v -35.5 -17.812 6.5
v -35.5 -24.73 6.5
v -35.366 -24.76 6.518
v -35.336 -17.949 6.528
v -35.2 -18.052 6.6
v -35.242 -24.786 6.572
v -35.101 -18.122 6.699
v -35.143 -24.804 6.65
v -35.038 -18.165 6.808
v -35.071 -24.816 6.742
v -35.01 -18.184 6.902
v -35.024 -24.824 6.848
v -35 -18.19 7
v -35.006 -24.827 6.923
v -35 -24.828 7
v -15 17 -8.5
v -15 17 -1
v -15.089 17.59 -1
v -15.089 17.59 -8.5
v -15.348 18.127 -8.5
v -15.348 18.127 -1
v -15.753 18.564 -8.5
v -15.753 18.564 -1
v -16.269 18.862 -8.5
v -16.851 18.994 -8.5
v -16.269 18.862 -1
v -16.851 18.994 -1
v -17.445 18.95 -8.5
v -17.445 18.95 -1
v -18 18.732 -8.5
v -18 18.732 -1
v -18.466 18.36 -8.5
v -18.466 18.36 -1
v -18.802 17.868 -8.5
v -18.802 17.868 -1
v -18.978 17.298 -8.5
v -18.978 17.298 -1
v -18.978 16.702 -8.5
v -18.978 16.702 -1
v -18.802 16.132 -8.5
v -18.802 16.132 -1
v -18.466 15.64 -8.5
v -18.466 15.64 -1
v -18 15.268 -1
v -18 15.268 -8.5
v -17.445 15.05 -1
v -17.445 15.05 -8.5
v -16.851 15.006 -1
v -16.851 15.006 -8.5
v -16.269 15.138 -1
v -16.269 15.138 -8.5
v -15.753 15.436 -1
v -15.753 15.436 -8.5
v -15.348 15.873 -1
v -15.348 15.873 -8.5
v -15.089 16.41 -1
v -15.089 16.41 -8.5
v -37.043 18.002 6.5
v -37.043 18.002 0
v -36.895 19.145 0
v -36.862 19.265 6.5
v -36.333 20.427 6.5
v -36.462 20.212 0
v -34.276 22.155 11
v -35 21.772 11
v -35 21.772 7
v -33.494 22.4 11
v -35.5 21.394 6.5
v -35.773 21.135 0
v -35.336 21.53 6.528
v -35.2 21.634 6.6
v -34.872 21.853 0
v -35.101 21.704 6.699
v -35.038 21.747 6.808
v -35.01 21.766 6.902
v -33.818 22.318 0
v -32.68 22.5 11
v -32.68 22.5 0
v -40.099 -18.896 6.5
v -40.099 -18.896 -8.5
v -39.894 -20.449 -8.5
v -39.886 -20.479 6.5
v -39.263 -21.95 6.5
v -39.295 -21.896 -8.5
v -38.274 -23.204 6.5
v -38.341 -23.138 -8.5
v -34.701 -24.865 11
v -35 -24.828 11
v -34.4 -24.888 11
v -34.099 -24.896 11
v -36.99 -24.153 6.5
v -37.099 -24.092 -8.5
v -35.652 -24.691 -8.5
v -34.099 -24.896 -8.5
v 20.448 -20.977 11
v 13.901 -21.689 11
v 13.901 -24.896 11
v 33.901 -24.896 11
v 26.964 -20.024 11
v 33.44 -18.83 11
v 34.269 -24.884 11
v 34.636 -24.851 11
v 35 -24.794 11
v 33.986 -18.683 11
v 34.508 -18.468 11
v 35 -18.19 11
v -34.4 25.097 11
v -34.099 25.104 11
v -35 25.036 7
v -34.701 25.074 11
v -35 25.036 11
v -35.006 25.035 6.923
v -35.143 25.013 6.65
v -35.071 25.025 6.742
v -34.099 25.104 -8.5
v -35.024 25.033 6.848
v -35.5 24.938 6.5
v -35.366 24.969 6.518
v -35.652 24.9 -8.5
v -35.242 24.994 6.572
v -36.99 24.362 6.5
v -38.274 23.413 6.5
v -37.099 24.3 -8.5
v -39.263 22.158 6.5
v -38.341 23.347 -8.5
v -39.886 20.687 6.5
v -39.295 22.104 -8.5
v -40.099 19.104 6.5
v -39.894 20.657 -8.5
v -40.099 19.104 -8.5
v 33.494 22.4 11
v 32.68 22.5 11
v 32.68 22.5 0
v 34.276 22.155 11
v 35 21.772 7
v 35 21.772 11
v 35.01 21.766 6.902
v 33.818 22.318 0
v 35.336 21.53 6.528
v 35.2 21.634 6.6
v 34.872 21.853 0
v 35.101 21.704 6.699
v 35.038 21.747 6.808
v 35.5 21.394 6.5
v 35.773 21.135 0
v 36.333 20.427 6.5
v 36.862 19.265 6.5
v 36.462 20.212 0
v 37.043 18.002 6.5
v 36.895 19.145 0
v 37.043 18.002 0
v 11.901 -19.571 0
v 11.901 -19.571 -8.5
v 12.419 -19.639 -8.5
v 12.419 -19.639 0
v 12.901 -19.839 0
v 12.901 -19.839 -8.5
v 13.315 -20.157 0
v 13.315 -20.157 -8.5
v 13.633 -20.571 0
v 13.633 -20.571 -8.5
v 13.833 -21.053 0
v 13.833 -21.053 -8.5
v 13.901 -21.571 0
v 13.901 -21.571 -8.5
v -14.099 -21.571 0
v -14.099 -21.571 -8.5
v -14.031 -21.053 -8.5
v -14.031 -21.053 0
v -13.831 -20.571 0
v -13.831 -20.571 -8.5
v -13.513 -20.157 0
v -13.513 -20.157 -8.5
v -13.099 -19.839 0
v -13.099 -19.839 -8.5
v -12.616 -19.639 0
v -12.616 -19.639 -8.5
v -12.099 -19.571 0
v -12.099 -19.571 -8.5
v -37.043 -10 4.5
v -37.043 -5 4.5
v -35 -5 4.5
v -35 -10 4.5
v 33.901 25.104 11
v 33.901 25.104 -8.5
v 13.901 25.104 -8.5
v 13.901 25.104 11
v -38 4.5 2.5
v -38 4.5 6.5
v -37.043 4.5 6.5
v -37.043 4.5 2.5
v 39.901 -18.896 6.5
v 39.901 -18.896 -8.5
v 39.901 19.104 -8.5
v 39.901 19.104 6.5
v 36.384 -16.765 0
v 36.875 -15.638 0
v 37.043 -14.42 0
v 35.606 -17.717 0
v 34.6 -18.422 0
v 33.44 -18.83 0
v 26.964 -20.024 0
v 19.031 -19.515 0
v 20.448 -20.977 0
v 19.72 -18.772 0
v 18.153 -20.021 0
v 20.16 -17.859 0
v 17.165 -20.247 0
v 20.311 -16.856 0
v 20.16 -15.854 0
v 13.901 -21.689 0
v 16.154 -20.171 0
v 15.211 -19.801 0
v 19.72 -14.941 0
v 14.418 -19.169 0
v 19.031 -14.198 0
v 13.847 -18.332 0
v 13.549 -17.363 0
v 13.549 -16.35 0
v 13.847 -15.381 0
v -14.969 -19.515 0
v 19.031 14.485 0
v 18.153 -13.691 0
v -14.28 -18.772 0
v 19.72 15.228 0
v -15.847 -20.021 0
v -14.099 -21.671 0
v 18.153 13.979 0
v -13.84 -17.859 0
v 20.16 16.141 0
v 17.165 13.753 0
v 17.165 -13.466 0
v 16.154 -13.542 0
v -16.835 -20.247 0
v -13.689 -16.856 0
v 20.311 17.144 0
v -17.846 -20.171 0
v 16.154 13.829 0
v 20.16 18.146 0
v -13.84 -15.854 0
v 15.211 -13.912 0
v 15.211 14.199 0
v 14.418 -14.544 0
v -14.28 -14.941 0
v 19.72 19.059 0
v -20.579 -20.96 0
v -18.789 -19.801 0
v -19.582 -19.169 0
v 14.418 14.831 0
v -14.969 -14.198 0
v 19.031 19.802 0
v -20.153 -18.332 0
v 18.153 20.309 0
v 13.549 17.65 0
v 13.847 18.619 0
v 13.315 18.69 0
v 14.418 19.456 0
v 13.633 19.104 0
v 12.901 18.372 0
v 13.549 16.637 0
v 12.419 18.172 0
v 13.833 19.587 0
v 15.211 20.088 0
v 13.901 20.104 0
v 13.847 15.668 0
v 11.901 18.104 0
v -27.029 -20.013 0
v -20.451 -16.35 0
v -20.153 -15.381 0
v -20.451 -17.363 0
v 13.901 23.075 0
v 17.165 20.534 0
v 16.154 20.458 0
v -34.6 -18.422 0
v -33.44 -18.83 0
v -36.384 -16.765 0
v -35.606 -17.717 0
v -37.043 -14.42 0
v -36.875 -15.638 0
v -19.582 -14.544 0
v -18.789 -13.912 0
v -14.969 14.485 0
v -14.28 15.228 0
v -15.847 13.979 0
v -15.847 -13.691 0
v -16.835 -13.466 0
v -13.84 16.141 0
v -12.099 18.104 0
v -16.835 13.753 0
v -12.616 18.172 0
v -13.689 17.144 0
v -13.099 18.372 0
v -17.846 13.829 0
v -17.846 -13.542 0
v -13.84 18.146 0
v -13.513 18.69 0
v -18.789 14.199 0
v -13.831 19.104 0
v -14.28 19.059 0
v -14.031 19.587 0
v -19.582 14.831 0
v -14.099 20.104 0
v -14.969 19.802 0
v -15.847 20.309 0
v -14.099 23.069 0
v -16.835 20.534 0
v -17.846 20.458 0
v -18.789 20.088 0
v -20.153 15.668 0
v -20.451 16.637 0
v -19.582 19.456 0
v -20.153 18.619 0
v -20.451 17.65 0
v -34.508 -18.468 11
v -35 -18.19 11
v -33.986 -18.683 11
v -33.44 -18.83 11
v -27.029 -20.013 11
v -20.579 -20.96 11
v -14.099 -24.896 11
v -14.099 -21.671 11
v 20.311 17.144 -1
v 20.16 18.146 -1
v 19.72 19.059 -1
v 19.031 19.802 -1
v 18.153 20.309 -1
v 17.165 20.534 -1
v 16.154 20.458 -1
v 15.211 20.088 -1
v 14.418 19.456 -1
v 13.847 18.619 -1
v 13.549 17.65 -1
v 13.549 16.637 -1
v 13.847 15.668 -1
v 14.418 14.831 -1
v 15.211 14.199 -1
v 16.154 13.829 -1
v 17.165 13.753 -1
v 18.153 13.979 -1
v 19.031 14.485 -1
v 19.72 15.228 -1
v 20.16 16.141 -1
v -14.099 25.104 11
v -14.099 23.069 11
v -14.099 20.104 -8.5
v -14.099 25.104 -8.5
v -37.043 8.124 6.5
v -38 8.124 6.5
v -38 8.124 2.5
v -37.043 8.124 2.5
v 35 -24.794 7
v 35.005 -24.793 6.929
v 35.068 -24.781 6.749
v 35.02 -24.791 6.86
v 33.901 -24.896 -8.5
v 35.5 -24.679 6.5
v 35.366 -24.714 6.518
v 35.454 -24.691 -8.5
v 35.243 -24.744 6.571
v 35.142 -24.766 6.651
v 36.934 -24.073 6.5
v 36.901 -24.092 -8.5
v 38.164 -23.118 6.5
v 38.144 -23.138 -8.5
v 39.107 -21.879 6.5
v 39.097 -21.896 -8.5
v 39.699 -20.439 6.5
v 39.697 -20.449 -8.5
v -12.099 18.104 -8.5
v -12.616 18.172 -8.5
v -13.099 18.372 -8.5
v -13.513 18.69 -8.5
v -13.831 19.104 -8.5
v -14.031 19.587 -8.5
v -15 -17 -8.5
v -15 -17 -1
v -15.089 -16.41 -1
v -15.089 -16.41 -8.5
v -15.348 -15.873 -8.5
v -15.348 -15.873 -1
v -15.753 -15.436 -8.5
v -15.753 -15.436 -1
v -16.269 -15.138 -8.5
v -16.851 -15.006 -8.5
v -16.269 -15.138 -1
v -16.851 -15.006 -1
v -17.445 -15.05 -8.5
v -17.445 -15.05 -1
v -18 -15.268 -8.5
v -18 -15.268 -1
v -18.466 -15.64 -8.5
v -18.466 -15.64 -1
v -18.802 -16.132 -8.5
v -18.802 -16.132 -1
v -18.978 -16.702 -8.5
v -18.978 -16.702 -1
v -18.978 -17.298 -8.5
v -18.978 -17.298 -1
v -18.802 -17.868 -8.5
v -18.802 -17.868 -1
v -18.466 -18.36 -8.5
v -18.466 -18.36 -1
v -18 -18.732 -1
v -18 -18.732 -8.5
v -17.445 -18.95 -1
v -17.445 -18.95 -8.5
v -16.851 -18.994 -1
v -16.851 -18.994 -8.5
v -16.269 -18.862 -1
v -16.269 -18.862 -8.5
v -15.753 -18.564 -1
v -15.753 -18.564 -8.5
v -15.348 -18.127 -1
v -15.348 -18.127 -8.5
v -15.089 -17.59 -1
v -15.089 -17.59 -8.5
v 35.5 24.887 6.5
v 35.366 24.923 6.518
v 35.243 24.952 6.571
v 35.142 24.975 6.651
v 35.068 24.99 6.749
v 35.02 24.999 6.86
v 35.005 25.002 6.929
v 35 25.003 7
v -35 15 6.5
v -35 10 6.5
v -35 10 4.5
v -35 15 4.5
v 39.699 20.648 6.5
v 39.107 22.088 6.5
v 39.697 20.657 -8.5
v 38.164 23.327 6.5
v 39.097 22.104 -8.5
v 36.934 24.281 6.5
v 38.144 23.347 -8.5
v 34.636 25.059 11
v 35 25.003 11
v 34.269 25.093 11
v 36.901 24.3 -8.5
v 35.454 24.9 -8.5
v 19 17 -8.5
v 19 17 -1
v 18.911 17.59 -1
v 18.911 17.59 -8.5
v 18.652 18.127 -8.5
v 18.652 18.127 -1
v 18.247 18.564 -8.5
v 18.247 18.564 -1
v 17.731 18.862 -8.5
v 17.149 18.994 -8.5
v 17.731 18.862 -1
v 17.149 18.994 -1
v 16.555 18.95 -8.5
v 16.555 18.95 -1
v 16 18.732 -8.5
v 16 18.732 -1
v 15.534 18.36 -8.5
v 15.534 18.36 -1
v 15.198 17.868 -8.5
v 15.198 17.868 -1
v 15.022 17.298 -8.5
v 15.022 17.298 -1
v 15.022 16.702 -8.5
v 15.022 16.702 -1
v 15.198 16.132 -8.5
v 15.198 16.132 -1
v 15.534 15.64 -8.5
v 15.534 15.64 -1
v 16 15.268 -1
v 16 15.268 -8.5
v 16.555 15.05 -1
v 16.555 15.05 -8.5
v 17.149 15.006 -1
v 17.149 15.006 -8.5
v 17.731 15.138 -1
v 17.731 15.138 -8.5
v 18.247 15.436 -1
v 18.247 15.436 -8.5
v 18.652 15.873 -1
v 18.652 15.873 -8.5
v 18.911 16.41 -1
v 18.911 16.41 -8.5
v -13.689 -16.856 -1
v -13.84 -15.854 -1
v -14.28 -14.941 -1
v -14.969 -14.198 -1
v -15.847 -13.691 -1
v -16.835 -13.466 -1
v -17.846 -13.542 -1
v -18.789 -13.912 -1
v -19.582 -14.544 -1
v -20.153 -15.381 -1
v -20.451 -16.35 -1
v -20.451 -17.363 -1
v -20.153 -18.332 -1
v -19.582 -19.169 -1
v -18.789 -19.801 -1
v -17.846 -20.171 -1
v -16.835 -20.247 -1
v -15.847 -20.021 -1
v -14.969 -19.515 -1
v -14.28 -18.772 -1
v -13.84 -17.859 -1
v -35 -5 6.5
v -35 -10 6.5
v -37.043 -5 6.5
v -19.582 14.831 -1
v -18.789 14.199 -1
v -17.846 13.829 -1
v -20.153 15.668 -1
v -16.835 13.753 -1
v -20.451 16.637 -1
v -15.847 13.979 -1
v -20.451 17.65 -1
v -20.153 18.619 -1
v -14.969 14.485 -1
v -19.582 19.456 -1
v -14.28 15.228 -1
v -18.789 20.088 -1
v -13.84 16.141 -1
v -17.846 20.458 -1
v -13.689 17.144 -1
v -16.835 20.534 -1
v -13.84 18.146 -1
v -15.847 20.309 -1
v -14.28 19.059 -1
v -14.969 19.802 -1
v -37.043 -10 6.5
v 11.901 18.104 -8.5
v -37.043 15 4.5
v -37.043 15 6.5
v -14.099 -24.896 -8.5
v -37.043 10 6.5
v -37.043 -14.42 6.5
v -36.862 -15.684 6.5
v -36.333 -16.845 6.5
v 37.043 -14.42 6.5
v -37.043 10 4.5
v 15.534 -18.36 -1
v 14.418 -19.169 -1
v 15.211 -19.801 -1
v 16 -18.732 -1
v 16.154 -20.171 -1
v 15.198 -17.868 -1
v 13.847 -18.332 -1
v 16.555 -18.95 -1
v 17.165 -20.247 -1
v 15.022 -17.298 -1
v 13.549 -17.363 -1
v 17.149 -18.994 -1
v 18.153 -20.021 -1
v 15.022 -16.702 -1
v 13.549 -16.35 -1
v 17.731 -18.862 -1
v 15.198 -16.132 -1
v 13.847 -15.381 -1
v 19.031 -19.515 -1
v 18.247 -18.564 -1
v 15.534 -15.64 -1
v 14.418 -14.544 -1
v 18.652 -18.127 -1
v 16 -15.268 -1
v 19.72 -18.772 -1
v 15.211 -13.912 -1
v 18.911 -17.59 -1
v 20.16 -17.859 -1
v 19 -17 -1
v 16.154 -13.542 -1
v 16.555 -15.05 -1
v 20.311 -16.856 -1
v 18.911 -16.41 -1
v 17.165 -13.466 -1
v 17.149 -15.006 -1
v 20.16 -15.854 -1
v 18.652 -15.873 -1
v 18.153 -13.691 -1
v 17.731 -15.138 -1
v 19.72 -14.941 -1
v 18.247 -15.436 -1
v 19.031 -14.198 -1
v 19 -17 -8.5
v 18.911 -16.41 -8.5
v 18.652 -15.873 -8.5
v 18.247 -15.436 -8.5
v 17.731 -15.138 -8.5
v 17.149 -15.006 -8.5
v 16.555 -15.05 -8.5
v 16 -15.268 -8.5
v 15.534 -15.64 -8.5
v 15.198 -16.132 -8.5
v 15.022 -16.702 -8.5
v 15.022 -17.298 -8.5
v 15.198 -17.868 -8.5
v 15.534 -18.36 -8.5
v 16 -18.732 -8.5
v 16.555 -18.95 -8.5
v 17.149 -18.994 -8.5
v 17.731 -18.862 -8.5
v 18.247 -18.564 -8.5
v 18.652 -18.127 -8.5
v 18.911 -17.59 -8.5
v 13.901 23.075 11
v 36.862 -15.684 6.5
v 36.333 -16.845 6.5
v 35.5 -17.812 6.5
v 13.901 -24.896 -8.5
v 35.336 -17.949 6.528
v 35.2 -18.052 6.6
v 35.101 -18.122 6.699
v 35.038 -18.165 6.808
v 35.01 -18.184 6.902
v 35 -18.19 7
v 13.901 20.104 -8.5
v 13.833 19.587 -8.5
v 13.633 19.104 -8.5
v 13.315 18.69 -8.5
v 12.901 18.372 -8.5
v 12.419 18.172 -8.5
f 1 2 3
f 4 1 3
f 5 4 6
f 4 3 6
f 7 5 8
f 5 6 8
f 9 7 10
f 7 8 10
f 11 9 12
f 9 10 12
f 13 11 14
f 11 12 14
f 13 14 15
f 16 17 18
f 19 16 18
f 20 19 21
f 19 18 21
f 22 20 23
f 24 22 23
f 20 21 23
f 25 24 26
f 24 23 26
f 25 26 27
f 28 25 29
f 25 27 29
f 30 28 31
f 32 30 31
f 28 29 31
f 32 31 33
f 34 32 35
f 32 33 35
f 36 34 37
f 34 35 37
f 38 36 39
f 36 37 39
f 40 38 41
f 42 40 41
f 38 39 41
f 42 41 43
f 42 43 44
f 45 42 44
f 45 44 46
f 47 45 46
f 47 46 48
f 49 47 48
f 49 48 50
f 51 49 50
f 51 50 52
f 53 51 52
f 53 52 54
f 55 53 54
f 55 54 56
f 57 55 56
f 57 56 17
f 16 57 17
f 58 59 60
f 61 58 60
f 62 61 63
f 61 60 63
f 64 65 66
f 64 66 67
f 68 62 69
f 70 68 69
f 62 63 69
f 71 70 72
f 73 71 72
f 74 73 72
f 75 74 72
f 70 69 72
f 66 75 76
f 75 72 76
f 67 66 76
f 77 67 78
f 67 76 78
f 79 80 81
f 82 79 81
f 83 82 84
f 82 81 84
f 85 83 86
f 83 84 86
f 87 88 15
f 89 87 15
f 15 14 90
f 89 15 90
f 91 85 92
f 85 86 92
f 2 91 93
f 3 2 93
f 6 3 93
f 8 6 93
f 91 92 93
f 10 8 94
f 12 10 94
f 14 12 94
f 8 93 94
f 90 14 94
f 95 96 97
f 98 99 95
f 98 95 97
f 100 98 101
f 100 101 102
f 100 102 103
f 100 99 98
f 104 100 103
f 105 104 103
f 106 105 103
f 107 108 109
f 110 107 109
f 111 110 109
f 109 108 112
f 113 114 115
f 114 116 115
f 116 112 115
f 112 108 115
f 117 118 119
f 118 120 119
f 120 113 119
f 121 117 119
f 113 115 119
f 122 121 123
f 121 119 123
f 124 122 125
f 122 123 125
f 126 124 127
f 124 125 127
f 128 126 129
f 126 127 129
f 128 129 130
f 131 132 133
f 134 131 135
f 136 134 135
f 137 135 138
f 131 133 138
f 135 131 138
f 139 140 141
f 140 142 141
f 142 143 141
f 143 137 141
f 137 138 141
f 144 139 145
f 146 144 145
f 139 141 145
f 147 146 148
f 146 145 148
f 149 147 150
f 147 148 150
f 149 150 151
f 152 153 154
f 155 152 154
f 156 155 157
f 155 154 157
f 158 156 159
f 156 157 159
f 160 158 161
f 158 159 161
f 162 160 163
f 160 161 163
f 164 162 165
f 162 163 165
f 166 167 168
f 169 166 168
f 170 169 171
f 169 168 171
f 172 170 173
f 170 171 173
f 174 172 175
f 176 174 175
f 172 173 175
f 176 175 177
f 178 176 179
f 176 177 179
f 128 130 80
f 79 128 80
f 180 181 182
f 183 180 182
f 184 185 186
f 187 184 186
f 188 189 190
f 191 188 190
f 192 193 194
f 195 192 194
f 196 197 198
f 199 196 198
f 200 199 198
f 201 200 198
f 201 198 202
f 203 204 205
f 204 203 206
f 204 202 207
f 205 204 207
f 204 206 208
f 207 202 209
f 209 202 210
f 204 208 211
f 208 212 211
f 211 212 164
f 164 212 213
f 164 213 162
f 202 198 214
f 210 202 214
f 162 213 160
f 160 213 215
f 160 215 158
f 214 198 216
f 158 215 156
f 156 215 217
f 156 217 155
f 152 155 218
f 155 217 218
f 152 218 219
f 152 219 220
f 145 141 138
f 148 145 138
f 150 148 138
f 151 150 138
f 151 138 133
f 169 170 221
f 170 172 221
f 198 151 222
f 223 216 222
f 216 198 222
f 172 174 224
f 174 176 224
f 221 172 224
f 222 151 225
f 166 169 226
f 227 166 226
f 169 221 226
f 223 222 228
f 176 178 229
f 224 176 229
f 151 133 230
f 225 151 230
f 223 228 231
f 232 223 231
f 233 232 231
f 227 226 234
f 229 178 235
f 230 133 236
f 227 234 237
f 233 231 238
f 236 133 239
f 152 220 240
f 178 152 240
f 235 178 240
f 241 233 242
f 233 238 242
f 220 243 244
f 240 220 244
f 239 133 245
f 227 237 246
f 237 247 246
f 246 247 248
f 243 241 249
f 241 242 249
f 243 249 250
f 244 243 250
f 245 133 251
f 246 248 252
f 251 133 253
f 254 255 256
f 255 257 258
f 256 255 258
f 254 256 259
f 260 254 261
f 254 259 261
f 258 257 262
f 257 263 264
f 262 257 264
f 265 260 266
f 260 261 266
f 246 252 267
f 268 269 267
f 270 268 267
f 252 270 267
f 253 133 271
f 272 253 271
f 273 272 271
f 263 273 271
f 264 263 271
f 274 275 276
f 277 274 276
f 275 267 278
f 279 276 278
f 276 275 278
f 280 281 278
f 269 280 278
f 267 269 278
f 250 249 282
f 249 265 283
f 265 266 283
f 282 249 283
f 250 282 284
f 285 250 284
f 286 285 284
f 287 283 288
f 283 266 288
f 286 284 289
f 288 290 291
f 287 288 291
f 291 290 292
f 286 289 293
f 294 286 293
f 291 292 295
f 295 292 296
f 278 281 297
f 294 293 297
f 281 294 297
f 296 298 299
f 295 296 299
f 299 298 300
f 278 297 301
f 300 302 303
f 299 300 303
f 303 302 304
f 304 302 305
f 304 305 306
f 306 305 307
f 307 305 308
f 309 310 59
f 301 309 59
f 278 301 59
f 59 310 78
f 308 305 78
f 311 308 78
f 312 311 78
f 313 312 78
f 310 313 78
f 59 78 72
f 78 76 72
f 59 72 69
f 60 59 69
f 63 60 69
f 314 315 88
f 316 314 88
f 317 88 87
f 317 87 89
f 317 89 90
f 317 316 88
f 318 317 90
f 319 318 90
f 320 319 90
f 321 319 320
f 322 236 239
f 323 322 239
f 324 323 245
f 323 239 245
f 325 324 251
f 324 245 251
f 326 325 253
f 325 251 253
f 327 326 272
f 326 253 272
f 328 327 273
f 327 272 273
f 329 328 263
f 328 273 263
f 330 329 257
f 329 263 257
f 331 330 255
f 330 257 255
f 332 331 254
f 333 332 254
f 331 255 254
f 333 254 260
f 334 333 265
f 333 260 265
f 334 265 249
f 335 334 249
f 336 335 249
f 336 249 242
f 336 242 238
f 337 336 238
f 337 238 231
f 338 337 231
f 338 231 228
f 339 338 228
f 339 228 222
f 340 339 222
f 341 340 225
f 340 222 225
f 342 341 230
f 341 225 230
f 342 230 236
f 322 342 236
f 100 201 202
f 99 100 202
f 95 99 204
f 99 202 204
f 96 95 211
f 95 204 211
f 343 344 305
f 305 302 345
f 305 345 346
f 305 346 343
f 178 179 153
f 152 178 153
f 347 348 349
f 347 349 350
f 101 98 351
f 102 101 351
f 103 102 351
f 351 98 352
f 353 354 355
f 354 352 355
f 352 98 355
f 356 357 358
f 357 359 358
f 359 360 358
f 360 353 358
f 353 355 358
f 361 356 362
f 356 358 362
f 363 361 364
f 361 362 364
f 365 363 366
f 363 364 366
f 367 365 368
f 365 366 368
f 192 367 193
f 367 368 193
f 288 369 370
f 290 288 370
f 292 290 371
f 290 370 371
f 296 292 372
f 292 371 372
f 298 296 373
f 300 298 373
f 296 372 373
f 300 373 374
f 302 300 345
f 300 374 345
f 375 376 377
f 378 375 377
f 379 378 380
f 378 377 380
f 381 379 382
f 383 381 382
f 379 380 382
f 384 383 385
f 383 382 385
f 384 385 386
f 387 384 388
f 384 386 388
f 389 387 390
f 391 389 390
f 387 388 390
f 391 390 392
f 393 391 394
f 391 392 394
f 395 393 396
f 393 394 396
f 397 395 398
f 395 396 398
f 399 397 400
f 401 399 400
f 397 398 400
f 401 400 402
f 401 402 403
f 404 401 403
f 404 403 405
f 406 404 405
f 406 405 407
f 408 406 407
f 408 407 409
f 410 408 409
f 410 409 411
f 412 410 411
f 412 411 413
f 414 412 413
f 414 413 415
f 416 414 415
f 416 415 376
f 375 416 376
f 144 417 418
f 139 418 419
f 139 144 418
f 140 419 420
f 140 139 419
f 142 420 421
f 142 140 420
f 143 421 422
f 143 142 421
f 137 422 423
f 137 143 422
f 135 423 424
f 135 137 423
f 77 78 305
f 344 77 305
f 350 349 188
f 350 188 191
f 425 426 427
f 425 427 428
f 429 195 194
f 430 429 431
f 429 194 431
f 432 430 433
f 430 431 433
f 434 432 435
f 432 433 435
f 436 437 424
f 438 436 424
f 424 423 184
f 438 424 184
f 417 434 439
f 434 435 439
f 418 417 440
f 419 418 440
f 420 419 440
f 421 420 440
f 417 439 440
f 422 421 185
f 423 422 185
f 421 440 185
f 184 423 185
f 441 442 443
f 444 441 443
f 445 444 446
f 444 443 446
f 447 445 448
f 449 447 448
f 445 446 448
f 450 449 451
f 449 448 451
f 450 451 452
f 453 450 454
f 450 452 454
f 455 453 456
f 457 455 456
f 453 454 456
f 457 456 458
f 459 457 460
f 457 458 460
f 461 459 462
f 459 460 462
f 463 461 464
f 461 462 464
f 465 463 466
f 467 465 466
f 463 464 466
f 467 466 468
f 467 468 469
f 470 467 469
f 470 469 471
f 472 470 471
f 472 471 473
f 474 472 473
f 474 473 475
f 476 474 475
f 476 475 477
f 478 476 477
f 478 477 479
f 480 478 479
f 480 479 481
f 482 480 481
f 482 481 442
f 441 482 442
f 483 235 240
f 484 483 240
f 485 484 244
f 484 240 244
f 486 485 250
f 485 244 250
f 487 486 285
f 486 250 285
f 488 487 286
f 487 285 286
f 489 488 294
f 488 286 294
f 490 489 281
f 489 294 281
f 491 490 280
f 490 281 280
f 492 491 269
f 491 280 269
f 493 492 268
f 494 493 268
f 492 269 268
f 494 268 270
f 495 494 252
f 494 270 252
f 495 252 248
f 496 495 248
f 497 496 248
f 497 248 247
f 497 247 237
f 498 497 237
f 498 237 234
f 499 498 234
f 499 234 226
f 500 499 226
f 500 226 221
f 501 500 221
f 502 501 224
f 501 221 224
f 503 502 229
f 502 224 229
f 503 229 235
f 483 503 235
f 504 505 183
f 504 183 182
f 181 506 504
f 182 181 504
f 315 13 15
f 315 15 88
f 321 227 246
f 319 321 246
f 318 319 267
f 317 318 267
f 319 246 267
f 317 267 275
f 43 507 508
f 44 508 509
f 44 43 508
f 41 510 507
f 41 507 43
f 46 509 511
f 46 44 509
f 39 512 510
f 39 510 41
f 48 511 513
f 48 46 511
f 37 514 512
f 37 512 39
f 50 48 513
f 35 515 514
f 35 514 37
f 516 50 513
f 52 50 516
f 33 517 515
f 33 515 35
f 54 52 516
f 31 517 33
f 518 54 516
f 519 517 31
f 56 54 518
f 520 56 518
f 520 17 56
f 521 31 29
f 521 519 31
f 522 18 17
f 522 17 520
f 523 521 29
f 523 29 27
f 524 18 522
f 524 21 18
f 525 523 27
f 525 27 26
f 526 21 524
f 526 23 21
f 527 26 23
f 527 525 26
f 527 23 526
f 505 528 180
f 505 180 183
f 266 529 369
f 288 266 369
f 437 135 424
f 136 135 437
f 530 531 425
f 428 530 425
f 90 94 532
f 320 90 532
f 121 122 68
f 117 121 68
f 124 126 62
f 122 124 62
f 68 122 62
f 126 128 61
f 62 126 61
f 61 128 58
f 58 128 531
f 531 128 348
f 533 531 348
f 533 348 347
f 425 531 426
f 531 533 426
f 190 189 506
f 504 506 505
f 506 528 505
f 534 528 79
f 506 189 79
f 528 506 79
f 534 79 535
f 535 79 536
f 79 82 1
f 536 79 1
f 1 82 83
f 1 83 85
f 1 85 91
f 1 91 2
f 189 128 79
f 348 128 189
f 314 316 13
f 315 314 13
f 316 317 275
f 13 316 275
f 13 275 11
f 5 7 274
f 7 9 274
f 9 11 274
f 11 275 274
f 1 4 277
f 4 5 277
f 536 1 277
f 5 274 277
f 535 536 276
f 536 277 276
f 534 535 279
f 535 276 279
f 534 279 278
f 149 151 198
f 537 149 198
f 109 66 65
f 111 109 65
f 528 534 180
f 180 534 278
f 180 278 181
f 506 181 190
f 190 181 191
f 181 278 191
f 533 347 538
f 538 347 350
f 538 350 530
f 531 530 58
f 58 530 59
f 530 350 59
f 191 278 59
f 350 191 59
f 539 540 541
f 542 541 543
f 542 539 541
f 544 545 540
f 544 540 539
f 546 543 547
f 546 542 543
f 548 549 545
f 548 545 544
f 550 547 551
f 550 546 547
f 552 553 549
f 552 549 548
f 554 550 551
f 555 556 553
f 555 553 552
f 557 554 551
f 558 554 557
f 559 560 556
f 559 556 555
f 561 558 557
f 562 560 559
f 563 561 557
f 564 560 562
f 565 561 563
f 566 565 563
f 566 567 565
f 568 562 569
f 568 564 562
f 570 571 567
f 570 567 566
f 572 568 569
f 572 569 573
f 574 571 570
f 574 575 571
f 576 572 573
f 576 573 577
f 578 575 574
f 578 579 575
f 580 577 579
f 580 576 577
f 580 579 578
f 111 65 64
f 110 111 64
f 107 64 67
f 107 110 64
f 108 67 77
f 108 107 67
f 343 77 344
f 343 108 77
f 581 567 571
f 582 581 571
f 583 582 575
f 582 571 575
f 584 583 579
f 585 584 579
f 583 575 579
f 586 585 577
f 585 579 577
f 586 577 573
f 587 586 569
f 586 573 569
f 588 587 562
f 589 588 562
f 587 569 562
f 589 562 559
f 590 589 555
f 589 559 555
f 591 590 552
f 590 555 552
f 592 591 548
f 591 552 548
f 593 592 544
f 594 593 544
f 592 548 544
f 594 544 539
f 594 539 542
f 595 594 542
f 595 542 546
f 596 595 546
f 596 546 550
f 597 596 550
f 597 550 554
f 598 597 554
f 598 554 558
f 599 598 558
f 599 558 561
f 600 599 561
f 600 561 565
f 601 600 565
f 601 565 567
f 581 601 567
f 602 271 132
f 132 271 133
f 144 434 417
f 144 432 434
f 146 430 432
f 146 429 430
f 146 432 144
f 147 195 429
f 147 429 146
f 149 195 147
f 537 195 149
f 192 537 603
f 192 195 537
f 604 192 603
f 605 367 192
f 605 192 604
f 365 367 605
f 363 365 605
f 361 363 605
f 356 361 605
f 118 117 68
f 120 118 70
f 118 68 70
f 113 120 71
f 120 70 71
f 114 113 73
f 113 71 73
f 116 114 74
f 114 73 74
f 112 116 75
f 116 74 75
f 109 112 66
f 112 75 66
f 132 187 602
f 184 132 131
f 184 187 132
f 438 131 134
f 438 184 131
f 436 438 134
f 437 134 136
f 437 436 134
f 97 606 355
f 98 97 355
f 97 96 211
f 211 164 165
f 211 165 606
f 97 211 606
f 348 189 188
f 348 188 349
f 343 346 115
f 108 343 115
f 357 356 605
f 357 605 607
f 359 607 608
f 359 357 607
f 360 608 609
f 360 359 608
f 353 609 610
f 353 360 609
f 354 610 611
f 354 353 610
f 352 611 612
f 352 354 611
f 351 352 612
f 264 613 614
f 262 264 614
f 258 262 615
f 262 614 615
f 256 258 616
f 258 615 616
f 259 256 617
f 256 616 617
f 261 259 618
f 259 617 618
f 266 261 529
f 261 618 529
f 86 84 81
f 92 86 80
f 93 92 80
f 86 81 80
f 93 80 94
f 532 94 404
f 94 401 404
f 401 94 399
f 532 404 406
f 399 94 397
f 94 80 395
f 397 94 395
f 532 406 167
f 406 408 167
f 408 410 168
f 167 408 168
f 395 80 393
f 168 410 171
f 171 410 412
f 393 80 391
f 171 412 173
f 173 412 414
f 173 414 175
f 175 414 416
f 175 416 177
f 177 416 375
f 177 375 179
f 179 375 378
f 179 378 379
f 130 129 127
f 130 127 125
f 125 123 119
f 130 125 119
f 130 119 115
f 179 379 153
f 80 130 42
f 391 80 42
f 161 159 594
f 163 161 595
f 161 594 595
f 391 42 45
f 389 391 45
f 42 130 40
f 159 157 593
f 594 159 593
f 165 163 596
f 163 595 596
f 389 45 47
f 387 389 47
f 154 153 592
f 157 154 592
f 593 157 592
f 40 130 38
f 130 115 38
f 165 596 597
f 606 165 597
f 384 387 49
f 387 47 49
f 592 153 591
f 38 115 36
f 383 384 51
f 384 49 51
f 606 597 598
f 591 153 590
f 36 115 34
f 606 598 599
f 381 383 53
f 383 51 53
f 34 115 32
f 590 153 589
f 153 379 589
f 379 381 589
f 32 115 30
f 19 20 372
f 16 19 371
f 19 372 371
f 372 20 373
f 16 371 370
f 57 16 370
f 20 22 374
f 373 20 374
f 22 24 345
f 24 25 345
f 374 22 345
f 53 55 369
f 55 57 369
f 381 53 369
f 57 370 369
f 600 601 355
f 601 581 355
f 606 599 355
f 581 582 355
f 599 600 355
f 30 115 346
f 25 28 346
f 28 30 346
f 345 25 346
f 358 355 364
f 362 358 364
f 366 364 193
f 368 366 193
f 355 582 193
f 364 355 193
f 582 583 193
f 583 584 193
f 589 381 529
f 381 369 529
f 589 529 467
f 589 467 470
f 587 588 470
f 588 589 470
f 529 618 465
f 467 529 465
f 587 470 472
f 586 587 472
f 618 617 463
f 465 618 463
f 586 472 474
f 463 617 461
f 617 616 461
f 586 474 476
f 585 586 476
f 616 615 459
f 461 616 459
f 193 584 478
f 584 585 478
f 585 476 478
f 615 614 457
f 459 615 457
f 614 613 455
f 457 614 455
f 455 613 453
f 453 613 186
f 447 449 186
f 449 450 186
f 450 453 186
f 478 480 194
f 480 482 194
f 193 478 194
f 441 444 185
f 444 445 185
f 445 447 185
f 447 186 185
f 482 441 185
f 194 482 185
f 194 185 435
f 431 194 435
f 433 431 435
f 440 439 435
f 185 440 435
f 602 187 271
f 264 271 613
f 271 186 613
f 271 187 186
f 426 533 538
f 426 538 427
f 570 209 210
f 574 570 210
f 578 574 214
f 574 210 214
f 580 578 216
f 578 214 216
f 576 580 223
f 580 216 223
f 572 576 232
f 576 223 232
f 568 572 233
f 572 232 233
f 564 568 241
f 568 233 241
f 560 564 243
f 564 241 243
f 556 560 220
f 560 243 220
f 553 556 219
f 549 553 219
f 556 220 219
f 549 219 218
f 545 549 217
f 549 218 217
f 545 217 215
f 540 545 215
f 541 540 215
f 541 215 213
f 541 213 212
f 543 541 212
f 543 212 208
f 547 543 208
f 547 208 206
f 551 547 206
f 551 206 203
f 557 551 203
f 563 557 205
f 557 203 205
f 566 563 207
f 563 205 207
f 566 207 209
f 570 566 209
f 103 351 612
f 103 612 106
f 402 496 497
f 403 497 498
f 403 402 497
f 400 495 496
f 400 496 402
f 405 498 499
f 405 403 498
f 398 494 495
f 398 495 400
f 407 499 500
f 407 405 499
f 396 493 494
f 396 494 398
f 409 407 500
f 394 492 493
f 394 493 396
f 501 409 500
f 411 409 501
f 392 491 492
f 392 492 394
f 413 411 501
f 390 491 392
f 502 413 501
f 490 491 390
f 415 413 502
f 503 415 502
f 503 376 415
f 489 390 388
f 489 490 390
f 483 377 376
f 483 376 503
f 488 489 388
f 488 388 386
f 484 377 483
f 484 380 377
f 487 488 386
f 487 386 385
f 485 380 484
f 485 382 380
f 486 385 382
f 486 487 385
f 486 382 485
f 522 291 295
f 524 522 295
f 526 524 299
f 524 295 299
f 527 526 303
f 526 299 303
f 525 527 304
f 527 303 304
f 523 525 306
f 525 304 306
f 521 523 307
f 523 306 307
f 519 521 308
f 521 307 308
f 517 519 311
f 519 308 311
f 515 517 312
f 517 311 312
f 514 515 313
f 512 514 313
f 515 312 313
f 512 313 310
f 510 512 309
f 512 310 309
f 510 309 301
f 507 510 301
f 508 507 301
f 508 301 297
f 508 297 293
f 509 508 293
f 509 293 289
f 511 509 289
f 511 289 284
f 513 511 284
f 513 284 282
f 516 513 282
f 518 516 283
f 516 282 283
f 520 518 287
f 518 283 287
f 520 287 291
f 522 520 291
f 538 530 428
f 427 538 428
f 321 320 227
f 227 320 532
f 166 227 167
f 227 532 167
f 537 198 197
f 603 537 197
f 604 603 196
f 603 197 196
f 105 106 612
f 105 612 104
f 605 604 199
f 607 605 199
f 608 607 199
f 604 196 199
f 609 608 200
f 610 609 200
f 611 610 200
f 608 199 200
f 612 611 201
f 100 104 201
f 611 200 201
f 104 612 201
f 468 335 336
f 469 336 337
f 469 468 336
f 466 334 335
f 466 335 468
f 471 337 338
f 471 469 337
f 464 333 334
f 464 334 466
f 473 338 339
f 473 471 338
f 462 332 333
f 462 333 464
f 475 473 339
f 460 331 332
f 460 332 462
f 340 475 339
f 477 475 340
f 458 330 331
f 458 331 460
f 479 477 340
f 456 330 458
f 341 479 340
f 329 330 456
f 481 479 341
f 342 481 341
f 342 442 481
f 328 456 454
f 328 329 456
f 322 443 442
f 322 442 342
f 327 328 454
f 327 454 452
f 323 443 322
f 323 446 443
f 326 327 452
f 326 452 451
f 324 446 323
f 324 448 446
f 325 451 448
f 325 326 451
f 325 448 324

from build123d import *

# Parameters (mm, degrees)
XOR_EXTRUDE1_580_DEPTH          = 11
XOR_EXTRUDE1_580_DEPTH_BACK     = 8.5
XOR_EXTRUDE2_CUT_582_DEPTH      = 23
XOR_EXTRUDE3_CUT_585_DEPTH      = 30
XOR_EXTRUDE3_CUT_585_DEPTH_BACK = 31.5
XOR_SKETCH4_MESH_586_R          = 2
XOR_EXTRUDE4_CUT_587_DEPTH      = 30
XOR_SKETCH5_MESH_588_R          = 3.4
XOR_EXTRUDE5_CUT_949_DEPTH      = 1
XOR_SKETCH6_MESH_1066_W         = 3.25
XOR_SKETCH6_MESH_1066_H         = 5
XOR_SKETCH6_MESH_1066_W_2       = 2.9
XOR_EXTRUDE6_MERGE_1279_DEPTH   = 2
XOR_SKETCH7_MESH_2256_W         = 3
XOR_SKETCH7_MESH_2256_H         = 3.62350981
XOR_EXTRUDE7_CUT_2327_DEPTH     = 4


with BuildPart() as part:
    # XOR_Sketch1 (Mesh)_7 → XOR_Extrude1_580 (new, two sides: drawn at the far end of the back side and taken through both)
    with BuildSketch(Plane.XY.offset(-XOR_EXTRUDE1_580_DEPTH_BACK)):
        with BuildLine():
            Line((11.901247371, 18.104240693), (-12.098752629, 18.104240693))
            ThreePointArc((-12.098752629, 18.104240693), (-13.512966192, 18.690027131), (-14.098752629, 20.104240693))
            Line((-14.098752629, 20.104240693), (-14.098752629, 25.104240693))
            Line((-14.098752629, 25.104240693), (-34.098752629, 25.104240693))
            ThreePointArc((-34.098752629, 25.104240693), (-38.341393316, 23.34688138), (-40.098752629, 19.104240693))
            Line((-40.098752629, 19.104240693), (-40.098752629, -18.895759307))
            ThreePointArc((-40.098752629, -18.895759307), (-38.341393316, -23.138399994), (-34.098752629, -24.895759307))
            Line((-34.098752629, -24.895759307), (-14.098752629, -24.895759307))
            Line((-14.098752629, -24.895759307), (-14.098752629, -21.570783007))
            ThreePointArc((-14.098752629, -21.570783007), (-13.512966192, -20.156569445), (-12.098752629, -19.570783007))
            Line((-12.098752629, -19.570783007), (11.901247371, -19.570783007))
            ThreePointArc((11.901247371, -19.570783007), (13.315460933, -20.156569445), (13.901247371, -21.570783007))
            Line((13.901247371, -21.570783007), (13.901247371, -24.895759307))
            Line((13.901247371, -24.895759307), (33.901247371, -24.895759307))
            ThreePointArc((33.901247371, -24.895759307), (38.143888058, -23.138399994), (39.901247371, -18.895759307))
            Line((39.901247371, -18.895759307), (39.901247371, 19.104240693))
            ThreePointArc((39.901247371, 19.104240693), (38.143888058, 23.34688138), (33.901247371, 25.104240693))
            Line((33.901247371, 25.104240693), (13.901247371, 25.104240693))
            Line((13.901247371, 25.104240693), (13.901247371, 20.104240693))
            ThreePointArc((13.901247371, 20.104240693), (13.315460933, 18.690027131), (11.901247371, 18.104240693))
        make_face()
    extrude(amount=XOR_EXTRUDE1_580_DEPTH + XOR_EXTRUDE1_580_DEPTH_BACK)

    # XOR_Sketch2 (Mesh)_581 → XOR_Extrude2 (Cut)_582 (cut)
    with BuildSketch(Plane.XY):
        with BuildLine():
            Line((37.042591497, 18.002105269), (37.042591497, -14.420226453))
            ThreePointArc((37.042591497, -14.420226453), (36.027448956, -17.267289587), (33.440027724, -18.829830542))
            ThreePointArc((33.440027724, -18.829830542), (16.804364648, -21.403203006), (0, -22.393587061))
            ThreePointArc((0, -22.393587061), (-16.804364648, -21.403203006), (-33.440027724, -18.829830542))
            ThreePointArc((-33.440027724, -18.829830542), (-36.027448956, -17.267289587), (-37.042591497, -14.420226453))
            Line((-37.042591497, -14.420226453), (-37.042591497, 18.002105269))
            ThreePointArc((-37.042591497, 18.002105269), (-35.772866321, 21.135047107), (-32.680225027, 22.5))
            Line((-32.680225027, 22.5), (0, 23.5))
            Line((0, 23.5), (32.680225027, 22.5))
            ThreePointArc((32.680225027, 22.5), (35.772866321, 21.135047107), (37.042591497, 18.002105269))
        make_face()
    extrude(amount=XOR_EXTRUDE2_CUT_582_DEPTH, mode=Mode.SUBTRACT)

    # XOR_Sketch3 (Mesh)_583 → XOR_Extrude3 (Cut)_585 (cut, two sides: drawn at the far end of the back side and taken through both)
    with BuildSketch(Plane(origin=(0, 0, 0), x_dir=(1, 0, 0), z_dir=(0, 1, 0)).offset(-XOR_EXTRUDE3_CUT_585_DEPTH_BACK)):
        with BuildLine():
            Line((35, -7), (35, -20.680063706))
            Line((35, -20.680063706), (45.656007765, -20.680063706))
            Line((45.656007765, -20.680063706), (45.656007765, -6.5))
            Line((45.656007765, -6.5), (35.5, -6.5))
            ThreePointArc((35.5, -6.5), (35.146446609, -6.646446609), (35, -7))
        make_face()
        with BuildLine():
            Line((-45.656007765, -20.680063706), (-45.656007765, -6.5))
            Line((-45.656007765, -6.5), (-35.5, -6.5))
            ThreePointArc((-35.5, -6.5), (-35.146446609, -6.646446609), (-35, -7))
            Line((-35, -7), (-35, -20.680063706))
            Line((-35, -20.680063706), (-45.656007765, -20.680063706))
        make_face()
    extrude(amount=XOR_EXTRUDE3_CUT_585_DEPTH + XOR_EXTRUDE3_CUT_585_DEPTH_BACK, mode=Mode.SUBTRACT)

    # XOR_Sketch4 (Mesh)_586 → XOR_Extrude4 (Cut)_587 (cut)
    with BuildSketch(Plane.XY):
        with Locations((-17, -17)):
            Circle(XOR_SKETCH4_MESH_586_R)
        with Locations((-17, 17)):
            Circle(XOR_SKETCH4_MESH_586_R)
        with Locations((17, -17)):
            Circle(XOR_SKETCH4_MESH_586_R)
        with Locations((17, 17)):
            Circle(XOR_SKETCH4_MESH_586_R)
    extrude(amount=-XOR_EXTRUDE4_CUT_587_DEPTH, mode=Mode.SUBTRACT)

    # XOR_Sketch5 (Mesh)_588 → XOR_Extrude5 (Cut)_949 (cut)
    with BuildSketch(Plane.XY):
        with Locations((16.910776866, 17.14358453)):
            Circle(XOR_SKETCH5_MESH_588_R)
        with Locations((-17.089223134, 17.14358453)):
            Circle(XOR_SKETCH5_MESH_588_R)
        with Locations((16.910776866, -16.85641547)):
            Circle(XOR_SKETCH5_MESH_588_R)
        with Locations((-17.089223134, -16.85641547)):
            Circle(XOR_SKETCH5_MESH_588_R)
    extrude(amount=-XOR_EXTRUDE5_CUT_949_DEPTH, mode=Mode.SUBTRACT)

    # XOR_Sketch6 (Mesh)_1066 → XOR_Extrude6 (Merge)_1279 (add)
    with BuildSketch(Plane.XY.offset(6.5)):
        with Locations((-36.625, -7.5)):
            Rectangle(XOR_SKETCH6_MESH_1066_W, XOR_SKETCH6_MESH_1066_H)
        with Locations((-36.45, 12.5)):
            Rectangle(XOR_SKETCH6_MESH_1066_W_2, XOR_SKETCH6_MESH_1066_H)
    extrude(amount=-XOR_EXTRUDE6_MERGE_1279_DEPTH)

    # XOR_Sketch7 (Mesh)_2256 → XOR_Extrude7 (Cut)_2327 (cut)
    with BuildSketch(Plane.XY.offset(6.5)):
        with Locations((-36.5, 6.311754905)):
            Rectangle(XOR_SKETCH7_MESH_2256_W, XOR_SKETCH7_MESH_2256_H)
    extrude(amount=-XOR_EXTRUDE7_CUT_2327_DEPTH, mode=Mode.SUBTRACT)


solid = part.part
